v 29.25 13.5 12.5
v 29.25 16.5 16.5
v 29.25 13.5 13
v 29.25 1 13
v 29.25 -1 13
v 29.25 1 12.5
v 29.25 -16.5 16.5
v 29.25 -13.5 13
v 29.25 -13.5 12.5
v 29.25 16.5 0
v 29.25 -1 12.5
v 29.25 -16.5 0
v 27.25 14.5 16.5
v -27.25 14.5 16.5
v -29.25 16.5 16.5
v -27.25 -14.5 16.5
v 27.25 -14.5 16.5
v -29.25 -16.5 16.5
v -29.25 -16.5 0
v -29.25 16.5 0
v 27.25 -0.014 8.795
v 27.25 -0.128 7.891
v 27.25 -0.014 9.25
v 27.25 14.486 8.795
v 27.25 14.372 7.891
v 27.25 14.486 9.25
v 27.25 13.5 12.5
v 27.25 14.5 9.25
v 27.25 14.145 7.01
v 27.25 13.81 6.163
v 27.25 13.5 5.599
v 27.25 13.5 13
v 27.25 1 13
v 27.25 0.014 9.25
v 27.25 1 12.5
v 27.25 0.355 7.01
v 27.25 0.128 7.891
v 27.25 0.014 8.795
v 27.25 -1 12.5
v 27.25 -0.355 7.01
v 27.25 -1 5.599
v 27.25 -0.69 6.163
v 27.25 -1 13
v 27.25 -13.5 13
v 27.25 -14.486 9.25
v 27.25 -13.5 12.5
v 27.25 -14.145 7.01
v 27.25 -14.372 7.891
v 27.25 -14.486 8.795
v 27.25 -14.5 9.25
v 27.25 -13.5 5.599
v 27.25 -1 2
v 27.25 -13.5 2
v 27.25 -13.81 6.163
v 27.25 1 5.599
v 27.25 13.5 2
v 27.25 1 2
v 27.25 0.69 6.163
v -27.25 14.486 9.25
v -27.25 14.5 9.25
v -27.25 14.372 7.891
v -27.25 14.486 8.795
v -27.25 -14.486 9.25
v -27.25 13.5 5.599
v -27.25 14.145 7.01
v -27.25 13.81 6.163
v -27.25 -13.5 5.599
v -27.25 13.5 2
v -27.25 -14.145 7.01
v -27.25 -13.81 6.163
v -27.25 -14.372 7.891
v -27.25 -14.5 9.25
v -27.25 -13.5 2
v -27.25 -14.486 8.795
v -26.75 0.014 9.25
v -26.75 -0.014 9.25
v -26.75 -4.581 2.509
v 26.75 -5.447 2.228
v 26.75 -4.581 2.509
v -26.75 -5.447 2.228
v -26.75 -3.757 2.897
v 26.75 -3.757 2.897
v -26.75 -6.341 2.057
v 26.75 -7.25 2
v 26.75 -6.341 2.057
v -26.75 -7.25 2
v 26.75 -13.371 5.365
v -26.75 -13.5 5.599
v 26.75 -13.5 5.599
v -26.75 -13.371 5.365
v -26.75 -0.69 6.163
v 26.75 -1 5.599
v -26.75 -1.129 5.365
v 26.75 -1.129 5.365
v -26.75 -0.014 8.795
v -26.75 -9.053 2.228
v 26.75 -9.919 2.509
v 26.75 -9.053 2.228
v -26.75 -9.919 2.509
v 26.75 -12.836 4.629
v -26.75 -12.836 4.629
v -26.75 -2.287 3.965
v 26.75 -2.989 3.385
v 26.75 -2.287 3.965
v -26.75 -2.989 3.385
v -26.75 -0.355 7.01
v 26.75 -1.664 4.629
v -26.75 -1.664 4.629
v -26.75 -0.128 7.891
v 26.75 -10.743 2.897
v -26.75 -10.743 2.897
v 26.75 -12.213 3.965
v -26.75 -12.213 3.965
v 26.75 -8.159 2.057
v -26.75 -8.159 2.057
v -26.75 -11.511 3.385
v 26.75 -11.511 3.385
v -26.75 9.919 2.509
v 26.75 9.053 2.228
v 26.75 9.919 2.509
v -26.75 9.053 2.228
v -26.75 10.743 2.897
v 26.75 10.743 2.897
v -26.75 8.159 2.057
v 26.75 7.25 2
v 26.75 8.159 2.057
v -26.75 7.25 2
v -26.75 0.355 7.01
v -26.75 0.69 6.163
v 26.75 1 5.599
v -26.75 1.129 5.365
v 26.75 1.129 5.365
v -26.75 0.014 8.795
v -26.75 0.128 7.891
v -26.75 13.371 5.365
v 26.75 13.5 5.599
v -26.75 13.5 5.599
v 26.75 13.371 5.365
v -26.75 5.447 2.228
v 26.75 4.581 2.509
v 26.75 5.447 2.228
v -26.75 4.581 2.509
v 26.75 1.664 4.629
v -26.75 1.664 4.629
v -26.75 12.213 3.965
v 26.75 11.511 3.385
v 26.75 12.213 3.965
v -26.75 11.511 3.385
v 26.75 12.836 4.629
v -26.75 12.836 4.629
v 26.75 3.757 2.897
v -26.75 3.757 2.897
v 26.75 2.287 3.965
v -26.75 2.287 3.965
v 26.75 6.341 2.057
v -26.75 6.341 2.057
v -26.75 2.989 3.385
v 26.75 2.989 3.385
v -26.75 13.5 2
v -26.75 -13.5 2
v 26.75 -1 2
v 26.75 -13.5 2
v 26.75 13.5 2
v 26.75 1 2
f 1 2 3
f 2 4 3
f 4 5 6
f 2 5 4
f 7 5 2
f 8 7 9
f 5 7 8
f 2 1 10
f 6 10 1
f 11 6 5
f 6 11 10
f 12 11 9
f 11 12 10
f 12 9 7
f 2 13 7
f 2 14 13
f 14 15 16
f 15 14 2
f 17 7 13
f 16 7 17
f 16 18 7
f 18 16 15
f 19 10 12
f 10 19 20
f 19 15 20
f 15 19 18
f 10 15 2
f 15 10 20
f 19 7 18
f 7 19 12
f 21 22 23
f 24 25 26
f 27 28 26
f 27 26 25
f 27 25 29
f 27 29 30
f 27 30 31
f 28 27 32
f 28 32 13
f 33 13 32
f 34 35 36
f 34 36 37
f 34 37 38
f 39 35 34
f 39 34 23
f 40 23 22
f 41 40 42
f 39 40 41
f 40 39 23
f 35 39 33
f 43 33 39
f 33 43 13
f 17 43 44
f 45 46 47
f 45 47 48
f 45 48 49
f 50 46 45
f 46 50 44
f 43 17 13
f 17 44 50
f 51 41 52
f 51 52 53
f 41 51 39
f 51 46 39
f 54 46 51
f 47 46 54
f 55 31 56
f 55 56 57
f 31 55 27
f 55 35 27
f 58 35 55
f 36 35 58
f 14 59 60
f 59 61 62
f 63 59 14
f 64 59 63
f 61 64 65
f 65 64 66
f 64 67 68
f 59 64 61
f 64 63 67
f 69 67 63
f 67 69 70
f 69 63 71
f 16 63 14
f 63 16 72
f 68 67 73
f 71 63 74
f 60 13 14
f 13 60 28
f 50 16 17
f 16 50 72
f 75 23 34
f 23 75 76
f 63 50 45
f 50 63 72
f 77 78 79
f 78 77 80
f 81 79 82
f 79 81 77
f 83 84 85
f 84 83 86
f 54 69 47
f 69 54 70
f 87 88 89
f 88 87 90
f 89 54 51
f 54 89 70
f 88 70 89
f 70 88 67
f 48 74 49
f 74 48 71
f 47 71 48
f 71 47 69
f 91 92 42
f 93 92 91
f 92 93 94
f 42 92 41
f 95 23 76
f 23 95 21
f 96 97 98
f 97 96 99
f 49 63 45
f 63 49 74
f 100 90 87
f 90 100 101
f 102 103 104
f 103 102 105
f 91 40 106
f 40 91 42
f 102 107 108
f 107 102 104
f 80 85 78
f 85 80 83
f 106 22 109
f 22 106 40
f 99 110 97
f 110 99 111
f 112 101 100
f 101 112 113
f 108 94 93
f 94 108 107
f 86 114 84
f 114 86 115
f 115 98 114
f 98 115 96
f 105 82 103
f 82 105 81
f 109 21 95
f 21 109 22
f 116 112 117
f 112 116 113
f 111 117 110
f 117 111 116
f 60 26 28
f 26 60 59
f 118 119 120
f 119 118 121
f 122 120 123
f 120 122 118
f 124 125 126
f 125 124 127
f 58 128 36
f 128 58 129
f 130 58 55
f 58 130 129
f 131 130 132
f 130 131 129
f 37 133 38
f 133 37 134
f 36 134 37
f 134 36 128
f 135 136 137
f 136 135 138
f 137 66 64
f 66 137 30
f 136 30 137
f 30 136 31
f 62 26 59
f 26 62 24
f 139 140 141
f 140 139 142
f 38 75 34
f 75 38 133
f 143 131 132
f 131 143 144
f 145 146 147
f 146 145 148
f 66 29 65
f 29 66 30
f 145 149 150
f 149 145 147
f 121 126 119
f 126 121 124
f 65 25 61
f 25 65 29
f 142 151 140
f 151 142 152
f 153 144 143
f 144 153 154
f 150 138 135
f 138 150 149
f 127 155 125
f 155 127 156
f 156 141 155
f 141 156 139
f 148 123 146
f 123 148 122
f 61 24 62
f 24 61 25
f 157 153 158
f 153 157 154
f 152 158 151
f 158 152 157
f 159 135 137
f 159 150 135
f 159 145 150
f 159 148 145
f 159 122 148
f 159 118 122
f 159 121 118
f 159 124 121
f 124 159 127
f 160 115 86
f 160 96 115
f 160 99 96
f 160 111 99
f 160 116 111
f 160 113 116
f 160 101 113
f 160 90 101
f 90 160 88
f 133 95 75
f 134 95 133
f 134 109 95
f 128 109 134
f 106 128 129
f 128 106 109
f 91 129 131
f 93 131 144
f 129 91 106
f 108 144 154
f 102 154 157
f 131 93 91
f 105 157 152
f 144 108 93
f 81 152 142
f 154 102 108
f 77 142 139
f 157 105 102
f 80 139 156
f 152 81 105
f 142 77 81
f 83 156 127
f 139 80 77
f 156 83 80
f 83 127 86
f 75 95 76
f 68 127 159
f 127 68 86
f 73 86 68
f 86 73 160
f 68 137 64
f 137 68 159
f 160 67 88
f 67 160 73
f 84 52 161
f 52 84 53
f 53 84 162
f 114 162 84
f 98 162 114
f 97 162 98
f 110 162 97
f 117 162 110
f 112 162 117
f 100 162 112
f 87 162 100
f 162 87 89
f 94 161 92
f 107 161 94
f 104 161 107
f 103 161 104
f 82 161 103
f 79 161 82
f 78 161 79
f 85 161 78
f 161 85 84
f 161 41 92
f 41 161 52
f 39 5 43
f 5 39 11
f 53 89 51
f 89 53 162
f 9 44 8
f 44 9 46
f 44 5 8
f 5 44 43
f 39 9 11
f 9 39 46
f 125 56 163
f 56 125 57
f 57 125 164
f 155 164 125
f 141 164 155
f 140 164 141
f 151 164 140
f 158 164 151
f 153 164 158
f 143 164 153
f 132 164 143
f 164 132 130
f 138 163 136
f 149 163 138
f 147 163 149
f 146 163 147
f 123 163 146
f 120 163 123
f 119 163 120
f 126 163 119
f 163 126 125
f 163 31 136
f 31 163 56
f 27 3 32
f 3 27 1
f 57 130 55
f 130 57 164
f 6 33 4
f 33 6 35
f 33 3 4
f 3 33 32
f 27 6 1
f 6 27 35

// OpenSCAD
/*
A Battery Compartment generator
enter the battery-type and the number of batteries you need and 
export the stl file. Print on a 3D-Printer and add some metall pieces into the slits
on the side
*/

AA = [ 14.5, 50.5 ];
AAA = [ 10.5,44.5 ];
C = [ 26.2, 50 ];
D = [ 34.2, 61.5 ]; 

// CHOOSE BATTERY TYPE AND COUNT 
typ = AA;
num =2;


translate( v = [-typ[1]/2 -4,-typ[0]*num/2 -2,0] ) {

difference() {
union() {
difference() {
   cube( size = [ typ[1] + 8, typ[0] * num + 4, typ[0] + 2] );
   translate( v = [2,2,2] ) {
   	cube( size = [typ[1] +4, typ[0] * num, typ[0] + 1 ]);
   }
}


translate( v= [2,2,2] ) {
for( i = [0:num-1] ) {
	translate( v = [0, typ[0] * i, 0] ) {
		difference() {
			cube( size = [typ[1]+4, typ[0], typ[0]/2] );
			translate( v = [ 0, typ[0]/2, typ[0]/2 ] ) {
				rotate( v = [0,1,0], a = 90 ) {
					cylinder( h = typ[1]+4, r = typ[0]/2, $fn=50 );
				}
			}
		}
	}
}
}
}
union() {
if ( num % 2 == 0 ) {
	for( i = [0:2:num-2] ) {
		translate( v = [2, typ[0] * i+3,2 ] ) {
			cube( size = [0.5, typ[0] * 2 - 2 , typ[0]]  );
		}	
	}
	if ( num  > 2 ) {
		for( i = [1:2:num-3] ) {
			translate( v = [5.5 + typ[1], typ[0] * i+3,2 ] ) {
				cube( size = [0.5, typ[0] * 2 - 2 , typ[0]]  );
			}	
		}
	}
	translate( v = [5.5+typ[1], 3, 2] ) {
		cube( size = [0.5, typ[0]-2, typ[0]]);
	}

	translate( v = [5.5+typ[1], 3, typ[0] - 2]) {
		cube( size = [3, typ[0]-2, 0.5] );
	}

	translate( v = [5.5+typ[1], 3+typ[0] * (num-1), 2] ) {
		cube( size = [0.5, typ[0]-2, typ[0]]);
	}

	translate( v = [5.5+typ[1], 3+typ[0] * (num-1), typ[0] - 2]) {
		cube( size = [3, typ[0]-2, 0.5] );
	}

	
} else {
	if ( num  > 1 ) {
		for( i = [0:2:num-2] ) {
			translate( v = [2, typ[0] * i+3,2 ] ) {
				cube( size = [0.5, typ[0] * 2 - 2 , typ[0]]  );
			}	
		}
		for( i = [1:2:num-2] ) {
			translate( v = [5.5 + typ[1], typ[0] * i+3,2 ] ) {
				cube( size = [0.5, typ[0] * 2 - 2 , typ[0]]  );
			}	
		}
	}
	translate( v = [5.5+typ[1], 3, 2] ) {
		cube( size = [0.5, typ[0]-2, typ[0]]);
	}
	translate( v = [5.5+typ[1], 3, typ[0] - 2]) {
		cube( size = [3, typ[0]-2, 0.5] );
	}

	translate( v = [2, 3+typ[0] * (num-1), 2] ) {
		cube( size = [0.5, typ[0]-2, typ[0]]);
	}
	translate( v = [-0.5, 3+typ[0] * (num-1), typ[0] - 2]) {
		cube( size = [3, typ[0]-2, 0.5] );
	}

} 
}
}

}
